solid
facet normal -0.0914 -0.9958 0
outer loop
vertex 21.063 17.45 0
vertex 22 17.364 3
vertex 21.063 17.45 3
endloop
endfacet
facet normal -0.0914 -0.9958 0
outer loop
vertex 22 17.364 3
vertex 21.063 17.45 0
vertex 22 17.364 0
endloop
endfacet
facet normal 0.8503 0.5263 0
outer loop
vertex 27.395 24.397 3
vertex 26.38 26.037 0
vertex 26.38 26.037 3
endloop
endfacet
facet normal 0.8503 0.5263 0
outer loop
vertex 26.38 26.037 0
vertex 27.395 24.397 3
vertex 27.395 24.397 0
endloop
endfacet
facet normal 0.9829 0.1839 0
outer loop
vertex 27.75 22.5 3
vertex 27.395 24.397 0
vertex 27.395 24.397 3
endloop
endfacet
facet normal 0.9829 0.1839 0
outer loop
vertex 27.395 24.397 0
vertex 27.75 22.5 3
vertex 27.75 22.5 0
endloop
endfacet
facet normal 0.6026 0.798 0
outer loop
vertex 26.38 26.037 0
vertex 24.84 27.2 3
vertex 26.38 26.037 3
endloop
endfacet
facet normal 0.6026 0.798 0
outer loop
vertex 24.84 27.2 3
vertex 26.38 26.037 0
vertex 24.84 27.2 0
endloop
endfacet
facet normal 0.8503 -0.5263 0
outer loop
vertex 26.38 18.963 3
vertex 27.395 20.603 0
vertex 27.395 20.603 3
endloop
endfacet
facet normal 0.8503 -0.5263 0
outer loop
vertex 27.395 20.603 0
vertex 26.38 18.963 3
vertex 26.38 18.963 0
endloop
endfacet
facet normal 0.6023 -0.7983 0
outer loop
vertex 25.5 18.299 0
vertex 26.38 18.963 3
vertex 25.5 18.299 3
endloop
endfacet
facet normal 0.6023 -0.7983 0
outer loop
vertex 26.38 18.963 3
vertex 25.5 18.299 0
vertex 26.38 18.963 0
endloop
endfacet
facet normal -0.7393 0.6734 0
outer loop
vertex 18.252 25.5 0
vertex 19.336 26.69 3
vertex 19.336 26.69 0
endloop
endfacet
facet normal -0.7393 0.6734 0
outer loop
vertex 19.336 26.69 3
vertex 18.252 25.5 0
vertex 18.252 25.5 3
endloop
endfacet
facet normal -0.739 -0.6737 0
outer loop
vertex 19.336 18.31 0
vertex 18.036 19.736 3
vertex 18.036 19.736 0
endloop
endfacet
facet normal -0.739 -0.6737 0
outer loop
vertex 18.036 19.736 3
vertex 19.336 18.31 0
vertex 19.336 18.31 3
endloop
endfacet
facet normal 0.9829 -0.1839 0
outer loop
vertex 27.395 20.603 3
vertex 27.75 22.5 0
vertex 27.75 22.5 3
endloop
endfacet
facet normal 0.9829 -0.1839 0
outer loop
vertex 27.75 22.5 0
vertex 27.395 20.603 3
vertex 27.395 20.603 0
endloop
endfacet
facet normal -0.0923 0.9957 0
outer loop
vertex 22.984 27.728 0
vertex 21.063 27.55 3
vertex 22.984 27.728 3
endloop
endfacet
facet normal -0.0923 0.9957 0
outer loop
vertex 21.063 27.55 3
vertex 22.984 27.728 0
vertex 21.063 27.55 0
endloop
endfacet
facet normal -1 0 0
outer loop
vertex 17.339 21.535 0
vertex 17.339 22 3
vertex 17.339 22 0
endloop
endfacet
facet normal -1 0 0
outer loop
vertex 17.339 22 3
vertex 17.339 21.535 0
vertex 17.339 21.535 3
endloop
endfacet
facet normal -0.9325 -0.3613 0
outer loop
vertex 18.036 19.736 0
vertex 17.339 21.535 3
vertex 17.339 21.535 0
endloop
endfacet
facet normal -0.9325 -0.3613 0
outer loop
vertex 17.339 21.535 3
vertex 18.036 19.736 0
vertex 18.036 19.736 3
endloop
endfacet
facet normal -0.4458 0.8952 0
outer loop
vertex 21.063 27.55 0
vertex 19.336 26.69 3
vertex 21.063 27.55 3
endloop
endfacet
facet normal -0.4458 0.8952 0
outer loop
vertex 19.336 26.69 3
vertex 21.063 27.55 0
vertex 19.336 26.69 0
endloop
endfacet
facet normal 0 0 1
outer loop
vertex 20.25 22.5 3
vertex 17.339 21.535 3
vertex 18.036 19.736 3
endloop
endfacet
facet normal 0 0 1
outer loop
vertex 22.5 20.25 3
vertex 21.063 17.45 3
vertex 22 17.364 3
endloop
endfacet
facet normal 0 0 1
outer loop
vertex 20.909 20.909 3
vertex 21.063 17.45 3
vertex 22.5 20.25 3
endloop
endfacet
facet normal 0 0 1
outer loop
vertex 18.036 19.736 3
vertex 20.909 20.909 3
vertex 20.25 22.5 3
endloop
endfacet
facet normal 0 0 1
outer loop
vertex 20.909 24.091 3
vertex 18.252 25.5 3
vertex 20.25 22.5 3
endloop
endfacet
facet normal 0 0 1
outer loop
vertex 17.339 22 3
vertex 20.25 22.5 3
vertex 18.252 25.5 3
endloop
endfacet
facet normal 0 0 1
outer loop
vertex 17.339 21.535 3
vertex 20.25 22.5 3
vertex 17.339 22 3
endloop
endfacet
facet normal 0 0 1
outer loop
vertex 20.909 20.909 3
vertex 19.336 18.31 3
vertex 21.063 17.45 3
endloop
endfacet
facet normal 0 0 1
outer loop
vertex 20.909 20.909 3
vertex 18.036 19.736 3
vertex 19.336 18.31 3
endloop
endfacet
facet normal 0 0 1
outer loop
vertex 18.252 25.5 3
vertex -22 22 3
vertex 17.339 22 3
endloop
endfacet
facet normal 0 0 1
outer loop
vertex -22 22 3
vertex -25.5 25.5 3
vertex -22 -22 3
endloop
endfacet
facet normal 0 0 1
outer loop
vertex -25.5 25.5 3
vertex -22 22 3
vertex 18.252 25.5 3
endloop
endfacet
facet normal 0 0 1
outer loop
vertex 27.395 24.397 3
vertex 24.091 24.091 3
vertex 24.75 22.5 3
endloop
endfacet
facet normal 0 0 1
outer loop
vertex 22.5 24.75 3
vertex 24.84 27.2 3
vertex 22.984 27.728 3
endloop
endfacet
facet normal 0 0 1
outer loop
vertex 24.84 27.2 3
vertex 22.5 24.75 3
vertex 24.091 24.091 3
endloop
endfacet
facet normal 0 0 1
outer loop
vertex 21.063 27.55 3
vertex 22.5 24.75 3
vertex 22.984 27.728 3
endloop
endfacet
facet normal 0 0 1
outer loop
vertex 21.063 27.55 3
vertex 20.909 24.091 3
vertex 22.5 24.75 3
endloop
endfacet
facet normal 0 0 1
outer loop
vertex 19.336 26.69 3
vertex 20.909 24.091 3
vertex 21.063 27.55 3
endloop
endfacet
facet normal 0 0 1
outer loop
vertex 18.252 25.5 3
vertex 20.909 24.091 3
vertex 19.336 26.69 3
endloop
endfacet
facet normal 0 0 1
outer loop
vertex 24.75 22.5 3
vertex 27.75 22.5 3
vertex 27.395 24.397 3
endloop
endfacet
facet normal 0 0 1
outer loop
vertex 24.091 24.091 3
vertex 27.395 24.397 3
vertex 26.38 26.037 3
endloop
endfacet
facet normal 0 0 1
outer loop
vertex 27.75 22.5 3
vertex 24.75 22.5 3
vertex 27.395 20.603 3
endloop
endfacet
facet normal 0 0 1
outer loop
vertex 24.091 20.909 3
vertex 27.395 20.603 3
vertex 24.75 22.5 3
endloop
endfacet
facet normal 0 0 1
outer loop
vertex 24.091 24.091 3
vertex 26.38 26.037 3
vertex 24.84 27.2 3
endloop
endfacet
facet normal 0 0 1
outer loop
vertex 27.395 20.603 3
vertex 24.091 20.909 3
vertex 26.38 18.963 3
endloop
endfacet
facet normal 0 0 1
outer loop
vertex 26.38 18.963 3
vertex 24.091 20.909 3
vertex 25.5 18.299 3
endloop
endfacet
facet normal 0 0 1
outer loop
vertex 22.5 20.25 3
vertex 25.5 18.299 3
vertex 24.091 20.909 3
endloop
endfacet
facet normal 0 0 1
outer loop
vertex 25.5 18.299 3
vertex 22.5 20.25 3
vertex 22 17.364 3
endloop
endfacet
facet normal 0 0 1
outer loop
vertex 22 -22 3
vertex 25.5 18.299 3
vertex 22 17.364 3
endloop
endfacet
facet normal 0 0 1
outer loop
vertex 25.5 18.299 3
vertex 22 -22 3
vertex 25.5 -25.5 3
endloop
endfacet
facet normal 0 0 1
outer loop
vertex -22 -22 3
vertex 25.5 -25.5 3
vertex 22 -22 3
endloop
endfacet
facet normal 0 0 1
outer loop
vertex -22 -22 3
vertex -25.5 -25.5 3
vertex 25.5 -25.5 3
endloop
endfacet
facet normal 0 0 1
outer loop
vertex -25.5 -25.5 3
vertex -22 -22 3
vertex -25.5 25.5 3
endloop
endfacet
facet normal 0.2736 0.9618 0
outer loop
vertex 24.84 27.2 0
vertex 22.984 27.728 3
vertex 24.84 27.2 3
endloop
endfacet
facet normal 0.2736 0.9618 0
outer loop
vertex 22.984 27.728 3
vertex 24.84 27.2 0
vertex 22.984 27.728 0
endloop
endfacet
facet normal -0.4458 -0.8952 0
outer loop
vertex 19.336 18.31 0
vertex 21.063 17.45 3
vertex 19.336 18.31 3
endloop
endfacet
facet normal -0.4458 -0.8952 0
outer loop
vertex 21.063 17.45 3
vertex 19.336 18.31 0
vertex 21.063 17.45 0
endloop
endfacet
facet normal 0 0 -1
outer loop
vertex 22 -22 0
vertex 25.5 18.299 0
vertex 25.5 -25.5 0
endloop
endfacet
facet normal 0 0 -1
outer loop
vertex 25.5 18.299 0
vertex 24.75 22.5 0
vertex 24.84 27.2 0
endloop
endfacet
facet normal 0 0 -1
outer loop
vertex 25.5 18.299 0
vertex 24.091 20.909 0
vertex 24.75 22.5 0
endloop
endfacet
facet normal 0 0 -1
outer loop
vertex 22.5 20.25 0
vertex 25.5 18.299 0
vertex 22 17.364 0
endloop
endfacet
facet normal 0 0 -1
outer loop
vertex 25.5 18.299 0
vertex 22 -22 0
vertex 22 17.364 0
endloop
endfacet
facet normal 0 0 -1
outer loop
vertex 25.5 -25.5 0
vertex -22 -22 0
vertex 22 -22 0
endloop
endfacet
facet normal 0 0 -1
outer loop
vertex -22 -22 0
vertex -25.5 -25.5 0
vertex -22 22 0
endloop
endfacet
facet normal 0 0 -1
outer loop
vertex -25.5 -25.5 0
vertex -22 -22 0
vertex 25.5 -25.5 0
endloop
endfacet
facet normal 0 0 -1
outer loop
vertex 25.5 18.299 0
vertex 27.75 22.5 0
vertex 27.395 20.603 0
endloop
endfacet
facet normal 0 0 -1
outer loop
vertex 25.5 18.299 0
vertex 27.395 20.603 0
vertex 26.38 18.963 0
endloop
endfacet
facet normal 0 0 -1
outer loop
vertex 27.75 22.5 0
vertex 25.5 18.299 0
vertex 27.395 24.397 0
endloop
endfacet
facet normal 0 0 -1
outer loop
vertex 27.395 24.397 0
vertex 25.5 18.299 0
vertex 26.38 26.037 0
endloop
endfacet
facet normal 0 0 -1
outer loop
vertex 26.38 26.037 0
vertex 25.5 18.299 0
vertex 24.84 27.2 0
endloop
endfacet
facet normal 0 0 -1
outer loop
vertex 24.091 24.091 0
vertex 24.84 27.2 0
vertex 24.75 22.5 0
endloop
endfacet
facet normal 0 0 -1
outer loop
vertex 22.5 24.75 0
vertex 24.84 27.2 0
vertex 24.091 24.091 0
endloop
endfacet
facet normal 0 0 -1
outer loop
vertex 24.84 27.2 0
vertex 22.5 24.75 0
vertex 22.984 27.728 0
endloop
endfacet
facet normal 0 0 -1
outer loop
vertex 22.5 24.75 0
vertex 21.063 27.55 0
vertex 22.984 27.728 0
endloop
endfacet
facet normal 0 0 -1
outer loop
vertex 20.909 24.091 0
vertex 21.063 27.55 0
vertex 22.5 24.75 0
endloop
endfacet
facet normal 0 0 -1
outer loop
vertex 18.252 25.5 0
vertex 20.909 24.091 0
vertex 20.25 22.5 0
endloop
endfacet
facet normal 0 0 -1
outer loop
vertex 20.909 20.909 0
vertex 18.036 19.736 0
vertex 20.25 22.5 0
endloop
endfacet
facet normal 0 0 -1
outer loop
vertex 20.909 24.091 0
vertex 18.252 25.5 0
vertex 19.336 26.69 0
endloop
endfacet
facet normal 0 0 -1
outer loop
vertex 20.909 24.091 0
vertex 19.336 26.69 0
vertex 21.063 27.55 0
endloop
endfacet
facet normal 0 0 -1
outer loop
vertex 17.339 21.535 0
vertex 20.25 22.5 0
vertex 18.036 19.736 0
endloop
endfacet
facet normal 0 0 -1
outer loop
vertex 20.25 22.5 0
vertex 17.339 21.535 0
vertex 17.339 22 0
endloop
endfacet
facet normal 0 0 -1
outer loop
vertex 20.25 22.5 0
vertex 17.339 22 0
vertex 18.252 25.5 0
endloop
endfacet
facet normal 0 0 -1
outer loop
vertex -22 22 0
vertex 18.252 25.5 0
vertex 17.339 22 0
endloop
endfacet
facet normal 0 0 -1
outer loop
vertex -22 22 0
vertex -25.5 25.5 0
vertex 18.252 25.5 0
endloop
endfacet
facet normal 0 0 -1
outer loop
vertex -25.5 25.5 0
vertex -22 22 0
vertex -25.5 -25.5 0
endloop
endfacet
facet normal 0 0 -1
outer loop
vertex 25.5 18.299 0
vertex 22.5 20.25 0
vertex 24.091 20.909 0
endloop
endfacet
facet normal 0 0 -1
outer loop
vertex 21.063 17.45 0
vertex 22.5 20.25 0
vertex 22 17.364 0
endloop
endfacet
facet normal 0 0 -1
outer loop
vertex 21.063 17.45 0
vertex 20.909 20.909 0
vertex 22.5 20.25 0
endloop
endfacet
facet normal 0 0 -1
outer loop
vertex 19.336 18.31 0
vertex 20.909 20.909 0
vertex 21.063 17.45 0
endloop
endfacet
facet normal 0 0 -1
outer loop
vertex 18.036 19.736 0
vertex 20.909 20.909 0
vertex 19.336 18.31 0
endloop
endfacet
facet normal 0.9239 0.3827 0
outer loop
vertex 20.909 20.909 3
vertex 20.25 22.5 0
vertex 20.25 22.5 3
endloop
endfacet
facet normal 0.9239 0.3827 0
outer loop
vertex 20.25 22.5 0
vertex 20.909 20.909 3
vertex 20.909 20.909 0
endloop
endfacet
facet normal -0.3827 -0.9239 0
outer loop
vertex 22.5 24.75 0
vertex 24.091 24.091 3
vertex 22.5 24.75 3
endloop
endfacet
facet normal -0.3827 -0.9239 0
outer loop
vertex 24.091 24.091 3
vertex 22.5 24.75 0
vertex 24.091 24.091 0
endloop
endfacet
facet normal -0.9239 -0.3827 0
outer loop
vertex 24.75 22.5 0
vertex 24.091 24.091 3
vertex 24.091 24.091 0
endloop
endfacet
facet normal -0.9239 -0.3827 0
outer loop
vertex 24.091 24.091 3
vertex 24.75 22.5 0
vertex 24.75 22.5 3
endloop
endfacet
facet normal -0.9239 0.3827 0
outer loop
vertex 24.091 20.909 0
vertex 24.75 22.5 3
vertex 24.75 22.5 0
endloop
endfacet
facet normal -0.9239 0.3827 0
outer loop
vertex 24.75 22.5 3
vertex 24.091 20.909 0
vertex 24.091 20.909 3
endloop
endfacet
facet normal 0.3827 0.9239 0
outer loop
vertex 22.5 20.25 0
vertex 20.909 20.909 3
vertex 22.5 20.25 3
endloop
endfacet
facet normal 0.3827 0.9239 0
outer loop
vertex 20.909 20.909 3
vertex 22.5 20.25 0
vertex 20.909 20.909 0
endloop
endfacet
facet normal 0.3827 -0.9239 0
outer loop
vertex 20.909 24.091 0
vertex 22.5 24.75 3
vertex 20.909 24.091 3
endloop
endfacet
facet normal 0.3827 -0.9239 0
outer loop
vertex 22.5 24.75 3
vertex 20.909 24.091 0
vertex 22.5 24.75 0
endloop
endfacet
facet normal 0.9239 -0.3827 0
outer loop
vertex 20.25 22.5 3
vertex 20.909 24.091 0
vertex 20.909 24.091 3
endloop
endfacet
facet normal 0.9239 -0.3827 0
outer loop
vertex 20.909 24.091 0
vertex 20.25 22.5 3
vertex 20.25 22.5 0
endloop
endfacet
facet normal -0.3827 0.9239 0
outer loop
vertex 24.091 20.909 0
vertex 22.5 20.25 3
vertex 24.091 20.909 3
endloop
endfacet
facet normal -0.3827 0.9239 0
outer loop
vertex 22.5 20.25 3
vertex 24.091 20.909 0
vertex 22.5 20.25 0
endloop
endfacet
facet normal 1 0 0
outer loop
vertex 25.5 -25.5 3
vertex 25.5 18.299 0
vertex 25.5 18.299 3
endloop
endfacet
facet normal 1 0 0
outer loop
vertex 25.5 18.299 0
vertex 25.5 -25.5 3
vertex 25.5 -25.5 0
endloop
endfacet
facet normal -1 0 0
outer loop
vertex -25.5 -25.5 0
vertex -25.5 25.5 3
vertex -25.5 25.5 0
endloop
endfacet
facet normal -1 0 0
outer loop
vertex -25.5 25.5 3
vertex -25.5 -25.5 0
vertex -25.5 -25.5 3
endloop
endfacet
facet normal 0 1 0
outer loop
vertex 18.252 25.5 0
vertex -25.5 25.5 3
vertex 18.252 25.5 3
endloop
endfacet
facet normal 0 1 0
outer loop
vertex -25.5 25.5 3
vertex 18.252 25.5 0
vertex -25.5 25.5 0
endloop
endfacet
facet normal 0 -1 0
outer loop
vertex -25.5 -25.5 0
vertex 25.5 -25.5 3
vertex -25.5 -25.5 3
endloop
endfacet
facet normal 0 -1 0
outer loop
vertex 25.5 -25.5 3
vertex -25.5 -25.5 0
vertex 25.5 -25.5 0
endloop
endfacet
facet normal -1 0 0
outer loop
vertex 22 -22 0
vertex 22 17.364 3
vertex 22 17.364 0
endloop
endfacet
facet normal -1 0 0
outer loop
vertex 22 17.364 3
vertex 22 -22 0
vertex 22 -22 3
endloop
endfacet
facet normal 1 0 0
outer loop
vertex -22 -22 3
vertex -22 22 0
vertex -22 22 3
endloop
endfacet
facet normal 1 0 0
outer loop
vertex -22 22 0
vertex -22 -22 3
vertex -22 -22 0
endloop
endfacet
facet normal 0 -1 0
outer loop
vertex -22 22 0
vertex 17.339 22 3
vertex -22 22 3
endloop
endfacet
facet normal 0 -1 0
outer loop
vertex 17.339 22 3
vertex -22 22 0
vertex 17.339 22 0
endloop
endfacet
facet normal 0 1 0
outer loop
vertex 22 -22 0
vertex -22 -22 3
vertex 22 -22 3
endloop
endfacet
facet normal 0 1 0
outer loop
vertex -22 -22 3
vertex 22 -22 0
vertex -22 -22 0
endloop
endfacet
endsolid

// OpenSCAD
//keychain-Customizable Lithopane by Mark G. Peeters 
//http://www.thingiverse.com/thing:308109
//version 1.3 
//if you are using openSCAD then you are cool! You can get DAT files for local use using this tool
//http://customizer.makerbot.com/image_surface
// i used the nice code for adjusting layers from here:
//http://www.thingiverse.com/thing:74322

// preview[view:south, tilt:top]
//
//
/* [Image] */

// Load a 100x100 pixel image.(images will be stretched to fit) Simple photos work best. Don't forget to click the Invert Colors checkbox! *** ALSO IF YOU HAVE LETTERS IN YOUR IMAGE make sure to reverse the image before uploading so the letters are not backwards.
image_file = "image-surface.dat"; // [image_surface:100x100]

/* [Adjustments] */

//shape NOTE: ALL units are in millimeters (mm)
shape = 1;//[0:circle, 1:square]
//over all size of the keychain. you picked
tag_size = 45;// [20:70]
// size for keyring 4.5 or 5 is good.
ring_hole=4.5;
// What layer height will you slice this at?  The thinner the better.
layer_height = 0.1;
//Use plastic color opacity to set this. The lower the layer height, the more layers you can use. you picked
number_of_layers = 20; // [5:30]
//Width of boarder lining the keychain (3mm is fine)
boarder_width = 3;//
//boarder thickness lining the keychain (at least 3mm for strength)
boarder_thick = 3;//

/* [Hidden] */

// base (white) will always be 2 layers thick
min_layer_height = layer_height*4;
height = layer_height*number_of_layers;
maxheight = height+min_layer_height;


// Make litho and trim bottom and sides
  difference() { //diff 1
  translate([0, 0, min_layer_height]) scale([(tag_size/100),(tag_size/100),height]) surface(file=image_file, center=true, convexity=5); //litosurface moved up min_layer_height
  translate([0,0,-(maxheight)]) linear_extrude(height=maxheight) square(tag_size, center=true);//cutting bottom off surface

if (shape==0) {//you picked circle shape------------------------------------
difference() {  //diff make tube to trim lith
                translate([0, 0, -7]) cylinder(maxheight+15,r= tag_size); //outside
                translate([0, 0, -9]) cylinder(maxheight+18,r= (tag_size/2)); //inside
               } //end diff make tube
translate([0, tag_size/2+boarder_width, -1])cylinder(maxheight+2,r= ring_hole/2); //ring hole
}//end if you picked circle------------------------------------------

if (shape==1) {//you picked square shape------------------------------------
difference() {  //diff make cube to trim litho
                translate([0, 0, -7]) cube(tag_size+15,center=true); //outside
               translate([0, 0, -9]) cube(tag_size,center=true); //inside
               } //end diff make tube
translate([tag_size/2, tag_size/2, -1])cylinder(maxheight+2,r= ring_hole/2); //ring hole
}//end if you picked square

}//end diff 1

//add boarder and loop
if (shape==0) {//you picked circle shape--------------------------
translate([0, tag_size/2+boarder_width, 0]) //move loop
difference(){//make loop
cylinder(boarder_thick,r=boarder_width+ring_hole/2); //ring support
translate([0, 0, -1])cylinder(boarder_thick+2,r= ring_hole/2); //ring hole
}

difference() {  //diff make frame tube
                 cylinder(boarder_thick,r= (tag_size/2)+boarder_width); //outside
                 cylinder(boarder_thick+1,r= (tag_size/2.02)); //inside
translate([0, tag_size/2+boarder_width, -1])cylinder(boarder_thick+2,r= ring_hole/2); //ring hole
                } //end diff make frame tube

}//end if you picked circle------------------------------------------

if (shape==1) {//you picked square shape------------------------------------
translate([tag_size/2, tag_size/2, 0]) //move loop
difference(){//make loop
cylinder(boarder_thick,r=boarder_width+ring_hole/2); //ring support
translate([0, 0, -1])cylinder(boarder_thick+2,r= ring_hole/2); //ring hole
}

difference() {  //diff make frame tube
                 translate([0,0,boarder_thick/2]) cube([tag_size+boarder_width*2,tag_size+boarder_width*2,boarder_thick],center=true); //outside
                 translate([0,0,boarder_thick/2]) cube([tag_size-1,tag_size-1,boarder_thick+1],center=true); //inside
translate([tag_size/2, tag_size/2, -1])cylinder(boarder_thick+2,r= ring_hole/2); //ring hole                
                        } //end diff make frame tube
}//end if you picked square------------------------------------------------
